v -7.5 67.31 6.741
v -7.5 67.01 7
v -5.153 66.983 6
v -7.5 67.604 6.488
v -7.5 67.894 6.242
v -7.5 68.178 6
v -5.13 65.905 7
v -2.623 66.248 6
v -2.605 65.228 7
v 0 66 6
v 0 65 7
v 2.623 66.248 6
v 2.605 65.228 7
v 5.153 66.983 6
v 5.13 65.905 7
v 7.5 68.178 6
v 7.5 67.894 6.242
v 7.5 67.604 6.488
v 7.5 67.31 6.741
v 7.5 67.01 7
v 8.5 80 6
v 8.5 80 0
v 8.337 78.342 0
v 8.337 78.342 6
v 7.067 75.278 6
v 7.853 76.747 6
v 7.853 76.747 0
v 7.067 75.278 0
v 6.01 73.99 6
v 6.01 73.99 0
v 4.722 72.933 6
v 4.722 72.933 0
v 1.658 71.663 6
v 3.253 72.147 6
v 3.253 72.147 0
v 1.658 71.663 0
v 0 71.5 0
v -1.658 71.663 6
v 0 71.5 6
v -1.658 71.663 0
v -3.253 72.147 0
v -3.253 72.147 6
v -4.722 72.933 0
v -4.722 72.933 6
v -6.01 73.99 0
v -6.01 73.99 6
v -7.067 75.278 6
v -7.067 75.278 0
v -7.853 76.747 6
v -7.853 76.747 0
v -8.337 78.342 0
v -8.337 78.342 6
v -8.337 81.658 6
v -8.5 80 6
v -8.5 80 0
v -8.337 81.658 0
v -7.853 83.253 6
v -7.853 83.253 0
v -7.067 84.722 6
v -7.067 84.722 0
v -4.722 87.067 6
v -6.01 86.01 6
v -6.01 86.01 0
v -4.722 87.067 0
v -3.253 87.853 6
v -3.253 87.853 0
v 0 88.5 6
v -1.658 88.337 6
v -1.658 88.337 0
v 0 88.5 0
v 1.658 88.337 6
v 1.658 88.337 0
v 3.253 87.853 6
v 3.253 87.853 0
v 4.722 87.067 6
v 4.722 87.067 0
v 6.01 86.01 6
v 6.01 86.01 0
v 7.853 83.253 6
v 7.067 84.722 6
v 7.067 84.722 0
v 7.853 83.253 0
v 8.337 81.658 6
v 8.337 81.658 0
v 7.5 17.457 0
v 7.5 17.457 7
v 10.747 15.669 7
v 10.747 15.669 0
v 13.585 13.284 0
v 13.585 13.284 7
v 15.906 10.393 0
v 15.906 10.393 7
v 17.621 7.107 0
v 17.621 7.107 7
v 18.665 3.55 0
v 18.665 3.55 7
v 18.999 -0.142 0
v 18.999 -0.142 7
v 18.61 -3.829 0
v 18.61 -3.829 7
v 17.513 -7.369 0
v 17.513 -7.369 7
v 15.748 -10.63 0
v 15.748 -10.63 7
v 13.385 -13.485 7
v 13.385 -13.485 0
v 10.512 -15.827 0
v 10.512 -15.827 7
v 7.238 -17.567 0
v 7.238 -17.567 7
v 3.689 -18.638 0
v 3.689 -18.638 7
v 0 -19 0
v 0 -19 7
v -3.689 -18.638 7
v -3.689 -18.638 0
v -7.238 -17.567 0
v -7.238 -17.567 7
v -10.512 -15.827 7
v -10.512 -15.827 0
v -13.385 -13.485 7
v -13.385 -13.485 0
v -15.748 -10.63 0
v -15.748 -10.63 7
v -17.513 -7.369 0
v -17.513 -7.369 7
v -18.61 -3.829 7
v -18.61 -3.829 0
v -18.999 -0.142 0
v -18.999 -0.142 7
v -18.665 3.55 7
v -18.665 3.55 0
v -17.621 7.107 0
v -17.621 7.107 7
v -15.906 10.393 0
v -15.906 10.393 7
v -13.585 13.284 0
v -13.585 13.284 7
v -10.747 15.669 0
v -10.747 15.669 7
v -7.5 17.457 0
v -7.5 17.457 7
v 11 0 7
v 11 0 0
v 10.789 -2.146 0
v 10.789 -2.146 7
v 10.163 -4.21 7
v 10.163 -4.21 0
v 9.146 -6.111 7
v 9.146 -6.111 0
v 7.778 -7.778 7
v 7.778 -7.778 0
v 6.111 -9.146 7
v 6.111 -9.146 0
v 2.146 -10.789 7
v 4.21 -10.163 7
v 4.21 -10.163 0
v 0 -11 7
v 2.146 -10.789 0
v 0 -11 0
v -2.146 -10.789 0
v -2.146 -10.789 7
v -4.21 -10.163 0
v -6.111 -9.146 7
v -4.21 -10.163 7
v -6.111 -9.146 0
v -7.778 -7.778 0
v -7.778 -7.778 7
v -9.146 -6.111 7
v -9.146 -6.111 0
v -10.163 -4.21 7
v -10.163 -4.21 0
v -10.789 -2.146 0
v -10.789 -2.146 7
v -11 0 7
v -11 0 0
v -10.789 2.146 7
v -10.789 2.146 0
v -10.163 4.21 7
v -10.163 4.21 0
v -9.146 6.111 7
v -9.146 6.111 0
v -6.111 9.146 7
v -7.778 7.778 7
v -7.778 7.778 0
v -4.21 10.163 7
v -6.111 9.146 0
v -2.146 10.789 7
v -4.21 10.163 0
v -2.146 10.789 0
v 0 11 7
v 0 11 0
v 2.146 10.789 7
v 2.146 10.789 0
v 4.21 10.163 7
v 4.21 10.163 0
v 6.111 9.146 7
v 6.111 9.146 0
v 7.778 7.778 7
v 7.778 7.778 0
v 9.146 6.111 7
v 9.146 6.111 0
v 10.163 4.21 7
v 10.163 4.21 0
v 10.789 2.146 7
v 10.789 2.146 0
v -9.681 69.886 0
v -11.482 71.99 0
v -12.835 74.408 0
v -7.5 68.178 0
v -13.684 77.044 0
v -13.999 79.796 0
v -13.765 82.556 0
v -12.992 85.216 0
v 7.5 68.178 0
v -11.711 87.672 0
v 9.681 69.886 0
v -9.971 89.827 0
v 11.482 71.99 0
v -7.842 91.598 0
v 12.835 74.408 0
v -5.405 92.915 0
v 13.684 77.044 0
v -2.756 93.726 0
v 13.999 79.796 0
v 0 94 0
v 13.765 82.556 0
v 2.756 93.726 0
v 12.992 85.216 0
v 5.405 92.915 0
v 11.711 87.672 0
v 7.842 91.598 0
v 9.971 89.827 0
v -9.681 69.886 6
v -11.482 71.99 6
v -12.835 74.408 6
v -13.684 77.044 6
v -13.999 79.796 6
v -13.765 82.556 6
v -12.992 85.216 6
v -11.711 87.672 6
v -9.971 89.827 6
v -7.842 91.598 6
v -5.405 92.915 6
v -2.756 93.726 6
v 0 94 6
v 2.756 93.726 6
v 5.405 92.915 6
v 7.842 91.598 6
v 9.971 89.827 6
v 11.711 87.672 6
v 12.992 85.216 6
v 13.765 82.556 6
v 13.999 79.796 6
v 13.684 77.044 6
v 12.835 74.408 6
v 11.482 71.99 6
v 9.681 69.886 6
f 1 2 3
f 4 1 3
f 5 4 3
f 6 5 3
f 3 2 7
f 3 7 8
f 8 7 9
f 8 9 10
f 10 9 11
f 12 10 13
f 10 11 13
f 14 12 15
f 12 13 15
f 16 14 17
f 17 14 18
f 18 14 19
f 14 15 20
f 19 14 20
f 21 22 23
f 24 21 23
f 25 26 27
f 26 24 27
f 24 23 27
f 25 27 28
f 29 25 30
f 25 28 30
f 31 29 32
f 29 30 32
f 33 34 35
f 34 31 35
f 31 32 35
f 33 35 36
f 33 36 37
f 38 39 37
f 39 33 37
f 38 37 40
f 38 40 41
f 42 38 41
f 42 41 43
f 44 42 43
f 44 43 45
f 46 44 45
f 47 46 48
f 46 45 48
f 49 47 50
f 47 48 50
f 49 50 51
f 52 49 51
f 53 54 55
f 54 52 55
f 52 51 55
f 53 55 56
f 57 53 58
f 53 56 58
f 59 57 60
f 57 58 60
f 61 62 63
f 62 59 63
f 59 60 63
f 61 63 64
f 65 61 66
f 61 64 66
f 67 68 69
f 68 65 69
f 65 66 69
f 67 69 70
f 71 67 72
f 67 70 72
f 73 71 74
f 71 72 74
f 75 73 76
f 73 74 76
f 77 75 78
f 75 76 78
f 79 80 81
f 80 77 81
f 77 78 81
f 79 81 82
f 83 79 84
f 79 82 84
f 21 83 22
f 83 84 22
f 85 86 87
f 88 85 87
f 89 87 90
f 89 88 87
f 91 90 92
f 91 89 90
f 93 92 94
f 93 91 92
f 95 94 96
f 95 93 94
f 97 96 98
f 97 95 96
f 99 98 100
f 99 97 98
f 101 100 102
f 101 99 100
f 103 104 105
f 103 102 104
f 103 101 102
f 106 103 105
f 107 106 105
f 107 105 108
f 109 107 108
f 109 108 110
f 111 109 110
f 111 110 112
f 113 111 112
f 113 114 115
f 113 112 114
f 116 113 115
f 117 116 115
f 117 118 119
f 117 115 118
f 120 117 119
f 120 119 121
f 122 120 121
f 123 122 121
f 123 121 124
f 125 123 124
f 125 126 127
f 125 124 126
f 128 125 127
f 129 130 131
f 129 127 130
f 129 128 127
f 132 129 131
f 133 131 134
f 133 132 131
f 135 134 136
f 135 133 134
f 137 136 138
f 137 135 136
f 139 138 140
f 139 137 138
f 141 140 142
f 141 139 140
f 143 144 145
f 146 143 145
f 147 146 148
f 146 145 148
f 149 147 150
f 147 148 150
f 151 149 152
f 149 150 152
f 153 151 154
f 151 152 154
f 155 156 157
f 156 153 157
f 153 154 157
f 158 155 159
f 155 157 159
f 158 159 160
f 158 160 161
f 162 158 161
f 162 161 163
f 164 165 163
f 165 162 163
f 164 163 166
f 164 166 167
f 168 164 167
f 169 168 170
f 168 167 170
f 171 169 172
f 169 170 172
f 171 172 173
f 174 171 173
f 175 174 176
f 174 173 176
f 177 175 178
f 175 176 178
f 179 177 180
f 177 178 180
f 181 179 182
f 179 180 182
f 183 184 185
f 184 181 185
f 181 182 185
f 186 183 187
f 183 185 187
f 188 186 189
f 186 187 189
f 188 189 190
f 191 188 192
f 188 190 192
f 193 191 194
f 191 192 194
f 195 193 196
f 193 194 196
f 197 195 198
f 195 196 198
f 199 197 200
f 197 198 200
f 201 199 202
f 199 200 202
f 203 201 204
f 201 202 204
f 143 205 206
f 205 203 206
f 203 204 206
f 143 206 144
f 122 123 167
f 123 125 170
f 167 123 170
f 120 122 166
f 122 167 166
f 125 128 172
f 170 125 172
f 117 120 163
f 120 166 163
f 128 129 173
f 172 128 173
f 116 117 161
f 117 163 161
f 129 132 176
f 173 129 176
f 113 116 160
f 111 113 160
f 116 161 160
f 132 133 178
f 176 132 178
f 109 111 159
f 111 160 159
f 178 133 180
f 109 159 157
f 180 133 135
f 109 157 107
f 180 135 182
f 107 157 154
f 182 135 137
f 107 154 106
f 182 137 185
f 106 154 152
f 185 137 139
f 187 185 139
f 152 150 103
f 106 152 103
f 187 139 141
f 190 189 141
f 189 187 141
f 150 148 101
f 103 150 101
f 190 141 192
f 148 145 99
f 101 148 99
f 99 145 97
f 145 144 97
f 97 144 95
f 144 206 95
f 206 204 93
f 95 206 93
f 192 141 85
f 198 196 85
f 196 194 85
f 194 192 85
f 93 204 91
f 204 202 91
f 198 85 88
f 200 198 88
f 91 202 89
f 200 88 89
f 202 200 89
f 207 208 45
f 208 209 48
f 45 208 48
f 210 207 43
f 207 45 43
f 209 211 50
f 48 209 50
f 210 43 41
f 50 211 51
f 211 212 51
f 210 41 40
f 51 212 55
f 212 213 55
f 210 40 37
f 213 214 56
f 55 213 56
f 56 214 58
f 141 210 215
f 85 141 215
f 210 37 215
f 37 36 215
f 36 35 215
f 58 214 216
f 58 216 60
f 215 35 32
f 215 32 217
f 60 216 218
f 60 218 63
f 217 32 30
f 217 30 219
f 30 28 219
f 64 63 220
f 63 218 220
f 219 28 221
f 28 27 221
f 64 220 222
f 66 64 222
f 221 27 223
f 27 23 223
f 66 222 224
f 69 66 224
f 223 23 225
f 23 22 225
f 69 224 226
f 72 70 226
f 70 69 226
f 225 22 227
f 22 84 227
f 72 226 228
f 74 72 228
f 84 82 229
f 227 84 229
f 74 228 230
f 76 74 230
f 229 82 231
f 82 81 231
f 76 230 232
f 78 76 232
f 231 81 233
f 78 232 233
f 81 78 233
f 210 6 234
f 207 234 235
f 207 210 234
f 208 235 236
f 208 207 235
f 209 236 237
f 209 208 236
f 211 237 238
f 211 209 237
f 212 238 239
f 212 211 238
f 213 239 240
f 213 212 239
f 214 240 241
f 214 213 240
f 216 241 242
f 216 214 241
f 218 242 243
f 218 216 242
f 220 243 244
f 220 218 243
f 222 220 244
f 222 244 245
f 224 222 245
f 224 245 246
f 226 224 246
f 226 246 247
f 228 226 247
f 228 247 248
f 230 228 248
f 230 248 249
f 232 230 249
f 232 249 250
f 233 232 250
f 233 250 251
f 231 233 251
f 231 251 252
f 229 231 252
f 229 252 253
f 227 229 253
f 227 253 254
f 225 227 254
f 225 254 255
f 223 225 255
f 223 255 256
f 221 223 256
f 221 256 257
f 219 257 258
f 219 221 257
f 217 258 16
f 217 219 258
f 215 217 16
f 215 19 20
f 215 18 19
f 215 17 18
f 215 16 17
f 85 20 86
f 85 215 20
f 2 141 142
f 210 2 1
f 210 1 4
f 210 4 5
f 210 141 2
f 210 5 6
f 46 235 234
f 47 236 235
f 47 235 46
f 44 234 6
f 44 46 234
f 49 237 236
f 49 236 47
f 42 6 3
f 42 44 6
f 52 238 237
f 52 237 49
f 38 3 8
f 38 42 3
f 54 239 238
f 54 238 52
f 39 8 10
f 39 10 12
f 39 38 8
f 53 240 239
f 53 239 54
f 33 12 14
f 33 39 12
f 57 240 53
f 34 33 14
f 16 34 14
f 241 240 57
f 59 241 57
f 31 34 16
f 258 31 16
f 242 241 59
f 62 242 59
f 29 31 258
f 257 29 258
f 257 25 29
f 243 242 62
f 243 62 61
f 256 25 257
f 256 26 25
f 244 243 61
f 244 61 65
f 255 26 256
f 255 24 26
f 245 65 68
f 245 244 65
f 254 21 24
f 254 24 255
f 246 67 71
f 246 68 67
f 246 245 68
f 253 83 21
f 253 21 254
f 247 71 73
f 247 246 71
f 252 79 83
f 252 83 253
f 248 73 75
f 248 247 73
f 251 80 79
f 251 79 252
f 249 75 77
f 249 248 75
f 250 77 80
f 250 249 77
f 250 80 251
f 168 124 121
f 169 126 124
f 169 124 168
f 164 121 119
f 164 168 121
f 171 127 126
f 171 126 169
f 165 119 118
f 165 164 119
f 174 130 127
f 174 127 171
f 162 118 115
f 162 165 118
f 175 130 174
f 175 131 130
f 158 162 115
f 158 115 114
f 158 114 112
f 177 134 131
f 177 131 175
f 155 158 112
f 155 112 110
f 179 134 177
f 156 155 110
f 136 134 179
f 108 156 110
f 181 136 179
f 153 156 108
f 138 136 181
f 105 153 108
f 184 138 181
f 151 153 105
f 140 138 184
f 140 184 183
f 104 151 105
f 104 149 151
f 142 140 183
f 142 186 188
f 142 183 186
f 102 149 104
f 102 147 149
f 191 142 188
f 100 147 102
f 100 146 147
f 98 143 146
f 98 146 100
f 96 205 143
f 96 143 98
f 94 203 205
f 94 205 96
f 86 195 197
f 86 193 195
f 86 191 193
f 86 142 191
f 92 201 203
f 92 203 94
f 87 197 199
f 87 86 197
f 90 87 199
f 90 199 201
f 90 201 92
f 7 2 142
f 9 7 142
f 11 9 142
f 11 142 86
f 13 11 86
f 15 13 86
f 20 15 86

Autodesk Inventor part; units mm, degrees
ref_plane "YZ Plane" through (0, 0, 0) normal (1, 0, 0) x (0, 1, 0)
ref_plane "XZ Plane" through (0, 0, 0) normal (0, 1, 0) x (-1, 0, 0)
ref_plane "XY Plane" through (0, 0, 0) normal (0, 0, 1) x (1, 0, 0)
sketch "Sketch1" plane through (0, 0, 0) normal (0, 0, 1) x (1, 0, 0)
  line L0 (0, 0) -> (0, 80) construction
  circle A0 centre (0, 0) radius 11
  circle A1 centre (0, 80) radius 8.5
  line L1 (7.5, 17.4571) -> (-7.5, 17.4571)
  line L2 (-7.5, 17.4571) -> (-7.5, 68.1784)
  line L3 (-7.5, 68.1784) -> (7.5, 68.1784)
  line L4 (7.5, 68.1784) -> (7.5, 17.4571)
  line L5 (7.5, 17.4571) -> (-7.5, 68.1784) construction
  line L6 (-7.5, 17.4571) -> (7.5, 68.1784) construction
  arc A2 (7.5, 68.1784) -> (-7.5, 68.1784) centre (0, 80) ccw
  arc A3 (-7.5, 17.4571) -> (7.5, 17.4571) centre (0, 0) ccw
  point P0 (0, 42.8177)
  point P1 (0, 42.8177)
  dimension "d0" = 22
  dimension "d1" = 17
  dimension "d2" = 80
  dimension "d3" = 5.5
  dimension "d4" = 8
  dimension "d5" = 15
extrude "Extrusion1" add sketch "Sketch1" along normal blind 7
sketch "Sketch2" plane through (0, 0, 7) normal (0, 0, 1) x (1, 0, 0)
  circle A0 centre (0, 80) radius 8.5 projected
  arc A1 (7.5, 68.1784) -> (-7.5, 68.1784) centre (0, 80) ccw projected
  circle A2 centre (0, 80) radius 14
extrude "Extrusion2" cut sketch "Sketch2" against normal blind 1
chamfer "Chamfer1" distance 1 angle 45 1 edges at (0, 66, 7)
properties part number "con rod"
